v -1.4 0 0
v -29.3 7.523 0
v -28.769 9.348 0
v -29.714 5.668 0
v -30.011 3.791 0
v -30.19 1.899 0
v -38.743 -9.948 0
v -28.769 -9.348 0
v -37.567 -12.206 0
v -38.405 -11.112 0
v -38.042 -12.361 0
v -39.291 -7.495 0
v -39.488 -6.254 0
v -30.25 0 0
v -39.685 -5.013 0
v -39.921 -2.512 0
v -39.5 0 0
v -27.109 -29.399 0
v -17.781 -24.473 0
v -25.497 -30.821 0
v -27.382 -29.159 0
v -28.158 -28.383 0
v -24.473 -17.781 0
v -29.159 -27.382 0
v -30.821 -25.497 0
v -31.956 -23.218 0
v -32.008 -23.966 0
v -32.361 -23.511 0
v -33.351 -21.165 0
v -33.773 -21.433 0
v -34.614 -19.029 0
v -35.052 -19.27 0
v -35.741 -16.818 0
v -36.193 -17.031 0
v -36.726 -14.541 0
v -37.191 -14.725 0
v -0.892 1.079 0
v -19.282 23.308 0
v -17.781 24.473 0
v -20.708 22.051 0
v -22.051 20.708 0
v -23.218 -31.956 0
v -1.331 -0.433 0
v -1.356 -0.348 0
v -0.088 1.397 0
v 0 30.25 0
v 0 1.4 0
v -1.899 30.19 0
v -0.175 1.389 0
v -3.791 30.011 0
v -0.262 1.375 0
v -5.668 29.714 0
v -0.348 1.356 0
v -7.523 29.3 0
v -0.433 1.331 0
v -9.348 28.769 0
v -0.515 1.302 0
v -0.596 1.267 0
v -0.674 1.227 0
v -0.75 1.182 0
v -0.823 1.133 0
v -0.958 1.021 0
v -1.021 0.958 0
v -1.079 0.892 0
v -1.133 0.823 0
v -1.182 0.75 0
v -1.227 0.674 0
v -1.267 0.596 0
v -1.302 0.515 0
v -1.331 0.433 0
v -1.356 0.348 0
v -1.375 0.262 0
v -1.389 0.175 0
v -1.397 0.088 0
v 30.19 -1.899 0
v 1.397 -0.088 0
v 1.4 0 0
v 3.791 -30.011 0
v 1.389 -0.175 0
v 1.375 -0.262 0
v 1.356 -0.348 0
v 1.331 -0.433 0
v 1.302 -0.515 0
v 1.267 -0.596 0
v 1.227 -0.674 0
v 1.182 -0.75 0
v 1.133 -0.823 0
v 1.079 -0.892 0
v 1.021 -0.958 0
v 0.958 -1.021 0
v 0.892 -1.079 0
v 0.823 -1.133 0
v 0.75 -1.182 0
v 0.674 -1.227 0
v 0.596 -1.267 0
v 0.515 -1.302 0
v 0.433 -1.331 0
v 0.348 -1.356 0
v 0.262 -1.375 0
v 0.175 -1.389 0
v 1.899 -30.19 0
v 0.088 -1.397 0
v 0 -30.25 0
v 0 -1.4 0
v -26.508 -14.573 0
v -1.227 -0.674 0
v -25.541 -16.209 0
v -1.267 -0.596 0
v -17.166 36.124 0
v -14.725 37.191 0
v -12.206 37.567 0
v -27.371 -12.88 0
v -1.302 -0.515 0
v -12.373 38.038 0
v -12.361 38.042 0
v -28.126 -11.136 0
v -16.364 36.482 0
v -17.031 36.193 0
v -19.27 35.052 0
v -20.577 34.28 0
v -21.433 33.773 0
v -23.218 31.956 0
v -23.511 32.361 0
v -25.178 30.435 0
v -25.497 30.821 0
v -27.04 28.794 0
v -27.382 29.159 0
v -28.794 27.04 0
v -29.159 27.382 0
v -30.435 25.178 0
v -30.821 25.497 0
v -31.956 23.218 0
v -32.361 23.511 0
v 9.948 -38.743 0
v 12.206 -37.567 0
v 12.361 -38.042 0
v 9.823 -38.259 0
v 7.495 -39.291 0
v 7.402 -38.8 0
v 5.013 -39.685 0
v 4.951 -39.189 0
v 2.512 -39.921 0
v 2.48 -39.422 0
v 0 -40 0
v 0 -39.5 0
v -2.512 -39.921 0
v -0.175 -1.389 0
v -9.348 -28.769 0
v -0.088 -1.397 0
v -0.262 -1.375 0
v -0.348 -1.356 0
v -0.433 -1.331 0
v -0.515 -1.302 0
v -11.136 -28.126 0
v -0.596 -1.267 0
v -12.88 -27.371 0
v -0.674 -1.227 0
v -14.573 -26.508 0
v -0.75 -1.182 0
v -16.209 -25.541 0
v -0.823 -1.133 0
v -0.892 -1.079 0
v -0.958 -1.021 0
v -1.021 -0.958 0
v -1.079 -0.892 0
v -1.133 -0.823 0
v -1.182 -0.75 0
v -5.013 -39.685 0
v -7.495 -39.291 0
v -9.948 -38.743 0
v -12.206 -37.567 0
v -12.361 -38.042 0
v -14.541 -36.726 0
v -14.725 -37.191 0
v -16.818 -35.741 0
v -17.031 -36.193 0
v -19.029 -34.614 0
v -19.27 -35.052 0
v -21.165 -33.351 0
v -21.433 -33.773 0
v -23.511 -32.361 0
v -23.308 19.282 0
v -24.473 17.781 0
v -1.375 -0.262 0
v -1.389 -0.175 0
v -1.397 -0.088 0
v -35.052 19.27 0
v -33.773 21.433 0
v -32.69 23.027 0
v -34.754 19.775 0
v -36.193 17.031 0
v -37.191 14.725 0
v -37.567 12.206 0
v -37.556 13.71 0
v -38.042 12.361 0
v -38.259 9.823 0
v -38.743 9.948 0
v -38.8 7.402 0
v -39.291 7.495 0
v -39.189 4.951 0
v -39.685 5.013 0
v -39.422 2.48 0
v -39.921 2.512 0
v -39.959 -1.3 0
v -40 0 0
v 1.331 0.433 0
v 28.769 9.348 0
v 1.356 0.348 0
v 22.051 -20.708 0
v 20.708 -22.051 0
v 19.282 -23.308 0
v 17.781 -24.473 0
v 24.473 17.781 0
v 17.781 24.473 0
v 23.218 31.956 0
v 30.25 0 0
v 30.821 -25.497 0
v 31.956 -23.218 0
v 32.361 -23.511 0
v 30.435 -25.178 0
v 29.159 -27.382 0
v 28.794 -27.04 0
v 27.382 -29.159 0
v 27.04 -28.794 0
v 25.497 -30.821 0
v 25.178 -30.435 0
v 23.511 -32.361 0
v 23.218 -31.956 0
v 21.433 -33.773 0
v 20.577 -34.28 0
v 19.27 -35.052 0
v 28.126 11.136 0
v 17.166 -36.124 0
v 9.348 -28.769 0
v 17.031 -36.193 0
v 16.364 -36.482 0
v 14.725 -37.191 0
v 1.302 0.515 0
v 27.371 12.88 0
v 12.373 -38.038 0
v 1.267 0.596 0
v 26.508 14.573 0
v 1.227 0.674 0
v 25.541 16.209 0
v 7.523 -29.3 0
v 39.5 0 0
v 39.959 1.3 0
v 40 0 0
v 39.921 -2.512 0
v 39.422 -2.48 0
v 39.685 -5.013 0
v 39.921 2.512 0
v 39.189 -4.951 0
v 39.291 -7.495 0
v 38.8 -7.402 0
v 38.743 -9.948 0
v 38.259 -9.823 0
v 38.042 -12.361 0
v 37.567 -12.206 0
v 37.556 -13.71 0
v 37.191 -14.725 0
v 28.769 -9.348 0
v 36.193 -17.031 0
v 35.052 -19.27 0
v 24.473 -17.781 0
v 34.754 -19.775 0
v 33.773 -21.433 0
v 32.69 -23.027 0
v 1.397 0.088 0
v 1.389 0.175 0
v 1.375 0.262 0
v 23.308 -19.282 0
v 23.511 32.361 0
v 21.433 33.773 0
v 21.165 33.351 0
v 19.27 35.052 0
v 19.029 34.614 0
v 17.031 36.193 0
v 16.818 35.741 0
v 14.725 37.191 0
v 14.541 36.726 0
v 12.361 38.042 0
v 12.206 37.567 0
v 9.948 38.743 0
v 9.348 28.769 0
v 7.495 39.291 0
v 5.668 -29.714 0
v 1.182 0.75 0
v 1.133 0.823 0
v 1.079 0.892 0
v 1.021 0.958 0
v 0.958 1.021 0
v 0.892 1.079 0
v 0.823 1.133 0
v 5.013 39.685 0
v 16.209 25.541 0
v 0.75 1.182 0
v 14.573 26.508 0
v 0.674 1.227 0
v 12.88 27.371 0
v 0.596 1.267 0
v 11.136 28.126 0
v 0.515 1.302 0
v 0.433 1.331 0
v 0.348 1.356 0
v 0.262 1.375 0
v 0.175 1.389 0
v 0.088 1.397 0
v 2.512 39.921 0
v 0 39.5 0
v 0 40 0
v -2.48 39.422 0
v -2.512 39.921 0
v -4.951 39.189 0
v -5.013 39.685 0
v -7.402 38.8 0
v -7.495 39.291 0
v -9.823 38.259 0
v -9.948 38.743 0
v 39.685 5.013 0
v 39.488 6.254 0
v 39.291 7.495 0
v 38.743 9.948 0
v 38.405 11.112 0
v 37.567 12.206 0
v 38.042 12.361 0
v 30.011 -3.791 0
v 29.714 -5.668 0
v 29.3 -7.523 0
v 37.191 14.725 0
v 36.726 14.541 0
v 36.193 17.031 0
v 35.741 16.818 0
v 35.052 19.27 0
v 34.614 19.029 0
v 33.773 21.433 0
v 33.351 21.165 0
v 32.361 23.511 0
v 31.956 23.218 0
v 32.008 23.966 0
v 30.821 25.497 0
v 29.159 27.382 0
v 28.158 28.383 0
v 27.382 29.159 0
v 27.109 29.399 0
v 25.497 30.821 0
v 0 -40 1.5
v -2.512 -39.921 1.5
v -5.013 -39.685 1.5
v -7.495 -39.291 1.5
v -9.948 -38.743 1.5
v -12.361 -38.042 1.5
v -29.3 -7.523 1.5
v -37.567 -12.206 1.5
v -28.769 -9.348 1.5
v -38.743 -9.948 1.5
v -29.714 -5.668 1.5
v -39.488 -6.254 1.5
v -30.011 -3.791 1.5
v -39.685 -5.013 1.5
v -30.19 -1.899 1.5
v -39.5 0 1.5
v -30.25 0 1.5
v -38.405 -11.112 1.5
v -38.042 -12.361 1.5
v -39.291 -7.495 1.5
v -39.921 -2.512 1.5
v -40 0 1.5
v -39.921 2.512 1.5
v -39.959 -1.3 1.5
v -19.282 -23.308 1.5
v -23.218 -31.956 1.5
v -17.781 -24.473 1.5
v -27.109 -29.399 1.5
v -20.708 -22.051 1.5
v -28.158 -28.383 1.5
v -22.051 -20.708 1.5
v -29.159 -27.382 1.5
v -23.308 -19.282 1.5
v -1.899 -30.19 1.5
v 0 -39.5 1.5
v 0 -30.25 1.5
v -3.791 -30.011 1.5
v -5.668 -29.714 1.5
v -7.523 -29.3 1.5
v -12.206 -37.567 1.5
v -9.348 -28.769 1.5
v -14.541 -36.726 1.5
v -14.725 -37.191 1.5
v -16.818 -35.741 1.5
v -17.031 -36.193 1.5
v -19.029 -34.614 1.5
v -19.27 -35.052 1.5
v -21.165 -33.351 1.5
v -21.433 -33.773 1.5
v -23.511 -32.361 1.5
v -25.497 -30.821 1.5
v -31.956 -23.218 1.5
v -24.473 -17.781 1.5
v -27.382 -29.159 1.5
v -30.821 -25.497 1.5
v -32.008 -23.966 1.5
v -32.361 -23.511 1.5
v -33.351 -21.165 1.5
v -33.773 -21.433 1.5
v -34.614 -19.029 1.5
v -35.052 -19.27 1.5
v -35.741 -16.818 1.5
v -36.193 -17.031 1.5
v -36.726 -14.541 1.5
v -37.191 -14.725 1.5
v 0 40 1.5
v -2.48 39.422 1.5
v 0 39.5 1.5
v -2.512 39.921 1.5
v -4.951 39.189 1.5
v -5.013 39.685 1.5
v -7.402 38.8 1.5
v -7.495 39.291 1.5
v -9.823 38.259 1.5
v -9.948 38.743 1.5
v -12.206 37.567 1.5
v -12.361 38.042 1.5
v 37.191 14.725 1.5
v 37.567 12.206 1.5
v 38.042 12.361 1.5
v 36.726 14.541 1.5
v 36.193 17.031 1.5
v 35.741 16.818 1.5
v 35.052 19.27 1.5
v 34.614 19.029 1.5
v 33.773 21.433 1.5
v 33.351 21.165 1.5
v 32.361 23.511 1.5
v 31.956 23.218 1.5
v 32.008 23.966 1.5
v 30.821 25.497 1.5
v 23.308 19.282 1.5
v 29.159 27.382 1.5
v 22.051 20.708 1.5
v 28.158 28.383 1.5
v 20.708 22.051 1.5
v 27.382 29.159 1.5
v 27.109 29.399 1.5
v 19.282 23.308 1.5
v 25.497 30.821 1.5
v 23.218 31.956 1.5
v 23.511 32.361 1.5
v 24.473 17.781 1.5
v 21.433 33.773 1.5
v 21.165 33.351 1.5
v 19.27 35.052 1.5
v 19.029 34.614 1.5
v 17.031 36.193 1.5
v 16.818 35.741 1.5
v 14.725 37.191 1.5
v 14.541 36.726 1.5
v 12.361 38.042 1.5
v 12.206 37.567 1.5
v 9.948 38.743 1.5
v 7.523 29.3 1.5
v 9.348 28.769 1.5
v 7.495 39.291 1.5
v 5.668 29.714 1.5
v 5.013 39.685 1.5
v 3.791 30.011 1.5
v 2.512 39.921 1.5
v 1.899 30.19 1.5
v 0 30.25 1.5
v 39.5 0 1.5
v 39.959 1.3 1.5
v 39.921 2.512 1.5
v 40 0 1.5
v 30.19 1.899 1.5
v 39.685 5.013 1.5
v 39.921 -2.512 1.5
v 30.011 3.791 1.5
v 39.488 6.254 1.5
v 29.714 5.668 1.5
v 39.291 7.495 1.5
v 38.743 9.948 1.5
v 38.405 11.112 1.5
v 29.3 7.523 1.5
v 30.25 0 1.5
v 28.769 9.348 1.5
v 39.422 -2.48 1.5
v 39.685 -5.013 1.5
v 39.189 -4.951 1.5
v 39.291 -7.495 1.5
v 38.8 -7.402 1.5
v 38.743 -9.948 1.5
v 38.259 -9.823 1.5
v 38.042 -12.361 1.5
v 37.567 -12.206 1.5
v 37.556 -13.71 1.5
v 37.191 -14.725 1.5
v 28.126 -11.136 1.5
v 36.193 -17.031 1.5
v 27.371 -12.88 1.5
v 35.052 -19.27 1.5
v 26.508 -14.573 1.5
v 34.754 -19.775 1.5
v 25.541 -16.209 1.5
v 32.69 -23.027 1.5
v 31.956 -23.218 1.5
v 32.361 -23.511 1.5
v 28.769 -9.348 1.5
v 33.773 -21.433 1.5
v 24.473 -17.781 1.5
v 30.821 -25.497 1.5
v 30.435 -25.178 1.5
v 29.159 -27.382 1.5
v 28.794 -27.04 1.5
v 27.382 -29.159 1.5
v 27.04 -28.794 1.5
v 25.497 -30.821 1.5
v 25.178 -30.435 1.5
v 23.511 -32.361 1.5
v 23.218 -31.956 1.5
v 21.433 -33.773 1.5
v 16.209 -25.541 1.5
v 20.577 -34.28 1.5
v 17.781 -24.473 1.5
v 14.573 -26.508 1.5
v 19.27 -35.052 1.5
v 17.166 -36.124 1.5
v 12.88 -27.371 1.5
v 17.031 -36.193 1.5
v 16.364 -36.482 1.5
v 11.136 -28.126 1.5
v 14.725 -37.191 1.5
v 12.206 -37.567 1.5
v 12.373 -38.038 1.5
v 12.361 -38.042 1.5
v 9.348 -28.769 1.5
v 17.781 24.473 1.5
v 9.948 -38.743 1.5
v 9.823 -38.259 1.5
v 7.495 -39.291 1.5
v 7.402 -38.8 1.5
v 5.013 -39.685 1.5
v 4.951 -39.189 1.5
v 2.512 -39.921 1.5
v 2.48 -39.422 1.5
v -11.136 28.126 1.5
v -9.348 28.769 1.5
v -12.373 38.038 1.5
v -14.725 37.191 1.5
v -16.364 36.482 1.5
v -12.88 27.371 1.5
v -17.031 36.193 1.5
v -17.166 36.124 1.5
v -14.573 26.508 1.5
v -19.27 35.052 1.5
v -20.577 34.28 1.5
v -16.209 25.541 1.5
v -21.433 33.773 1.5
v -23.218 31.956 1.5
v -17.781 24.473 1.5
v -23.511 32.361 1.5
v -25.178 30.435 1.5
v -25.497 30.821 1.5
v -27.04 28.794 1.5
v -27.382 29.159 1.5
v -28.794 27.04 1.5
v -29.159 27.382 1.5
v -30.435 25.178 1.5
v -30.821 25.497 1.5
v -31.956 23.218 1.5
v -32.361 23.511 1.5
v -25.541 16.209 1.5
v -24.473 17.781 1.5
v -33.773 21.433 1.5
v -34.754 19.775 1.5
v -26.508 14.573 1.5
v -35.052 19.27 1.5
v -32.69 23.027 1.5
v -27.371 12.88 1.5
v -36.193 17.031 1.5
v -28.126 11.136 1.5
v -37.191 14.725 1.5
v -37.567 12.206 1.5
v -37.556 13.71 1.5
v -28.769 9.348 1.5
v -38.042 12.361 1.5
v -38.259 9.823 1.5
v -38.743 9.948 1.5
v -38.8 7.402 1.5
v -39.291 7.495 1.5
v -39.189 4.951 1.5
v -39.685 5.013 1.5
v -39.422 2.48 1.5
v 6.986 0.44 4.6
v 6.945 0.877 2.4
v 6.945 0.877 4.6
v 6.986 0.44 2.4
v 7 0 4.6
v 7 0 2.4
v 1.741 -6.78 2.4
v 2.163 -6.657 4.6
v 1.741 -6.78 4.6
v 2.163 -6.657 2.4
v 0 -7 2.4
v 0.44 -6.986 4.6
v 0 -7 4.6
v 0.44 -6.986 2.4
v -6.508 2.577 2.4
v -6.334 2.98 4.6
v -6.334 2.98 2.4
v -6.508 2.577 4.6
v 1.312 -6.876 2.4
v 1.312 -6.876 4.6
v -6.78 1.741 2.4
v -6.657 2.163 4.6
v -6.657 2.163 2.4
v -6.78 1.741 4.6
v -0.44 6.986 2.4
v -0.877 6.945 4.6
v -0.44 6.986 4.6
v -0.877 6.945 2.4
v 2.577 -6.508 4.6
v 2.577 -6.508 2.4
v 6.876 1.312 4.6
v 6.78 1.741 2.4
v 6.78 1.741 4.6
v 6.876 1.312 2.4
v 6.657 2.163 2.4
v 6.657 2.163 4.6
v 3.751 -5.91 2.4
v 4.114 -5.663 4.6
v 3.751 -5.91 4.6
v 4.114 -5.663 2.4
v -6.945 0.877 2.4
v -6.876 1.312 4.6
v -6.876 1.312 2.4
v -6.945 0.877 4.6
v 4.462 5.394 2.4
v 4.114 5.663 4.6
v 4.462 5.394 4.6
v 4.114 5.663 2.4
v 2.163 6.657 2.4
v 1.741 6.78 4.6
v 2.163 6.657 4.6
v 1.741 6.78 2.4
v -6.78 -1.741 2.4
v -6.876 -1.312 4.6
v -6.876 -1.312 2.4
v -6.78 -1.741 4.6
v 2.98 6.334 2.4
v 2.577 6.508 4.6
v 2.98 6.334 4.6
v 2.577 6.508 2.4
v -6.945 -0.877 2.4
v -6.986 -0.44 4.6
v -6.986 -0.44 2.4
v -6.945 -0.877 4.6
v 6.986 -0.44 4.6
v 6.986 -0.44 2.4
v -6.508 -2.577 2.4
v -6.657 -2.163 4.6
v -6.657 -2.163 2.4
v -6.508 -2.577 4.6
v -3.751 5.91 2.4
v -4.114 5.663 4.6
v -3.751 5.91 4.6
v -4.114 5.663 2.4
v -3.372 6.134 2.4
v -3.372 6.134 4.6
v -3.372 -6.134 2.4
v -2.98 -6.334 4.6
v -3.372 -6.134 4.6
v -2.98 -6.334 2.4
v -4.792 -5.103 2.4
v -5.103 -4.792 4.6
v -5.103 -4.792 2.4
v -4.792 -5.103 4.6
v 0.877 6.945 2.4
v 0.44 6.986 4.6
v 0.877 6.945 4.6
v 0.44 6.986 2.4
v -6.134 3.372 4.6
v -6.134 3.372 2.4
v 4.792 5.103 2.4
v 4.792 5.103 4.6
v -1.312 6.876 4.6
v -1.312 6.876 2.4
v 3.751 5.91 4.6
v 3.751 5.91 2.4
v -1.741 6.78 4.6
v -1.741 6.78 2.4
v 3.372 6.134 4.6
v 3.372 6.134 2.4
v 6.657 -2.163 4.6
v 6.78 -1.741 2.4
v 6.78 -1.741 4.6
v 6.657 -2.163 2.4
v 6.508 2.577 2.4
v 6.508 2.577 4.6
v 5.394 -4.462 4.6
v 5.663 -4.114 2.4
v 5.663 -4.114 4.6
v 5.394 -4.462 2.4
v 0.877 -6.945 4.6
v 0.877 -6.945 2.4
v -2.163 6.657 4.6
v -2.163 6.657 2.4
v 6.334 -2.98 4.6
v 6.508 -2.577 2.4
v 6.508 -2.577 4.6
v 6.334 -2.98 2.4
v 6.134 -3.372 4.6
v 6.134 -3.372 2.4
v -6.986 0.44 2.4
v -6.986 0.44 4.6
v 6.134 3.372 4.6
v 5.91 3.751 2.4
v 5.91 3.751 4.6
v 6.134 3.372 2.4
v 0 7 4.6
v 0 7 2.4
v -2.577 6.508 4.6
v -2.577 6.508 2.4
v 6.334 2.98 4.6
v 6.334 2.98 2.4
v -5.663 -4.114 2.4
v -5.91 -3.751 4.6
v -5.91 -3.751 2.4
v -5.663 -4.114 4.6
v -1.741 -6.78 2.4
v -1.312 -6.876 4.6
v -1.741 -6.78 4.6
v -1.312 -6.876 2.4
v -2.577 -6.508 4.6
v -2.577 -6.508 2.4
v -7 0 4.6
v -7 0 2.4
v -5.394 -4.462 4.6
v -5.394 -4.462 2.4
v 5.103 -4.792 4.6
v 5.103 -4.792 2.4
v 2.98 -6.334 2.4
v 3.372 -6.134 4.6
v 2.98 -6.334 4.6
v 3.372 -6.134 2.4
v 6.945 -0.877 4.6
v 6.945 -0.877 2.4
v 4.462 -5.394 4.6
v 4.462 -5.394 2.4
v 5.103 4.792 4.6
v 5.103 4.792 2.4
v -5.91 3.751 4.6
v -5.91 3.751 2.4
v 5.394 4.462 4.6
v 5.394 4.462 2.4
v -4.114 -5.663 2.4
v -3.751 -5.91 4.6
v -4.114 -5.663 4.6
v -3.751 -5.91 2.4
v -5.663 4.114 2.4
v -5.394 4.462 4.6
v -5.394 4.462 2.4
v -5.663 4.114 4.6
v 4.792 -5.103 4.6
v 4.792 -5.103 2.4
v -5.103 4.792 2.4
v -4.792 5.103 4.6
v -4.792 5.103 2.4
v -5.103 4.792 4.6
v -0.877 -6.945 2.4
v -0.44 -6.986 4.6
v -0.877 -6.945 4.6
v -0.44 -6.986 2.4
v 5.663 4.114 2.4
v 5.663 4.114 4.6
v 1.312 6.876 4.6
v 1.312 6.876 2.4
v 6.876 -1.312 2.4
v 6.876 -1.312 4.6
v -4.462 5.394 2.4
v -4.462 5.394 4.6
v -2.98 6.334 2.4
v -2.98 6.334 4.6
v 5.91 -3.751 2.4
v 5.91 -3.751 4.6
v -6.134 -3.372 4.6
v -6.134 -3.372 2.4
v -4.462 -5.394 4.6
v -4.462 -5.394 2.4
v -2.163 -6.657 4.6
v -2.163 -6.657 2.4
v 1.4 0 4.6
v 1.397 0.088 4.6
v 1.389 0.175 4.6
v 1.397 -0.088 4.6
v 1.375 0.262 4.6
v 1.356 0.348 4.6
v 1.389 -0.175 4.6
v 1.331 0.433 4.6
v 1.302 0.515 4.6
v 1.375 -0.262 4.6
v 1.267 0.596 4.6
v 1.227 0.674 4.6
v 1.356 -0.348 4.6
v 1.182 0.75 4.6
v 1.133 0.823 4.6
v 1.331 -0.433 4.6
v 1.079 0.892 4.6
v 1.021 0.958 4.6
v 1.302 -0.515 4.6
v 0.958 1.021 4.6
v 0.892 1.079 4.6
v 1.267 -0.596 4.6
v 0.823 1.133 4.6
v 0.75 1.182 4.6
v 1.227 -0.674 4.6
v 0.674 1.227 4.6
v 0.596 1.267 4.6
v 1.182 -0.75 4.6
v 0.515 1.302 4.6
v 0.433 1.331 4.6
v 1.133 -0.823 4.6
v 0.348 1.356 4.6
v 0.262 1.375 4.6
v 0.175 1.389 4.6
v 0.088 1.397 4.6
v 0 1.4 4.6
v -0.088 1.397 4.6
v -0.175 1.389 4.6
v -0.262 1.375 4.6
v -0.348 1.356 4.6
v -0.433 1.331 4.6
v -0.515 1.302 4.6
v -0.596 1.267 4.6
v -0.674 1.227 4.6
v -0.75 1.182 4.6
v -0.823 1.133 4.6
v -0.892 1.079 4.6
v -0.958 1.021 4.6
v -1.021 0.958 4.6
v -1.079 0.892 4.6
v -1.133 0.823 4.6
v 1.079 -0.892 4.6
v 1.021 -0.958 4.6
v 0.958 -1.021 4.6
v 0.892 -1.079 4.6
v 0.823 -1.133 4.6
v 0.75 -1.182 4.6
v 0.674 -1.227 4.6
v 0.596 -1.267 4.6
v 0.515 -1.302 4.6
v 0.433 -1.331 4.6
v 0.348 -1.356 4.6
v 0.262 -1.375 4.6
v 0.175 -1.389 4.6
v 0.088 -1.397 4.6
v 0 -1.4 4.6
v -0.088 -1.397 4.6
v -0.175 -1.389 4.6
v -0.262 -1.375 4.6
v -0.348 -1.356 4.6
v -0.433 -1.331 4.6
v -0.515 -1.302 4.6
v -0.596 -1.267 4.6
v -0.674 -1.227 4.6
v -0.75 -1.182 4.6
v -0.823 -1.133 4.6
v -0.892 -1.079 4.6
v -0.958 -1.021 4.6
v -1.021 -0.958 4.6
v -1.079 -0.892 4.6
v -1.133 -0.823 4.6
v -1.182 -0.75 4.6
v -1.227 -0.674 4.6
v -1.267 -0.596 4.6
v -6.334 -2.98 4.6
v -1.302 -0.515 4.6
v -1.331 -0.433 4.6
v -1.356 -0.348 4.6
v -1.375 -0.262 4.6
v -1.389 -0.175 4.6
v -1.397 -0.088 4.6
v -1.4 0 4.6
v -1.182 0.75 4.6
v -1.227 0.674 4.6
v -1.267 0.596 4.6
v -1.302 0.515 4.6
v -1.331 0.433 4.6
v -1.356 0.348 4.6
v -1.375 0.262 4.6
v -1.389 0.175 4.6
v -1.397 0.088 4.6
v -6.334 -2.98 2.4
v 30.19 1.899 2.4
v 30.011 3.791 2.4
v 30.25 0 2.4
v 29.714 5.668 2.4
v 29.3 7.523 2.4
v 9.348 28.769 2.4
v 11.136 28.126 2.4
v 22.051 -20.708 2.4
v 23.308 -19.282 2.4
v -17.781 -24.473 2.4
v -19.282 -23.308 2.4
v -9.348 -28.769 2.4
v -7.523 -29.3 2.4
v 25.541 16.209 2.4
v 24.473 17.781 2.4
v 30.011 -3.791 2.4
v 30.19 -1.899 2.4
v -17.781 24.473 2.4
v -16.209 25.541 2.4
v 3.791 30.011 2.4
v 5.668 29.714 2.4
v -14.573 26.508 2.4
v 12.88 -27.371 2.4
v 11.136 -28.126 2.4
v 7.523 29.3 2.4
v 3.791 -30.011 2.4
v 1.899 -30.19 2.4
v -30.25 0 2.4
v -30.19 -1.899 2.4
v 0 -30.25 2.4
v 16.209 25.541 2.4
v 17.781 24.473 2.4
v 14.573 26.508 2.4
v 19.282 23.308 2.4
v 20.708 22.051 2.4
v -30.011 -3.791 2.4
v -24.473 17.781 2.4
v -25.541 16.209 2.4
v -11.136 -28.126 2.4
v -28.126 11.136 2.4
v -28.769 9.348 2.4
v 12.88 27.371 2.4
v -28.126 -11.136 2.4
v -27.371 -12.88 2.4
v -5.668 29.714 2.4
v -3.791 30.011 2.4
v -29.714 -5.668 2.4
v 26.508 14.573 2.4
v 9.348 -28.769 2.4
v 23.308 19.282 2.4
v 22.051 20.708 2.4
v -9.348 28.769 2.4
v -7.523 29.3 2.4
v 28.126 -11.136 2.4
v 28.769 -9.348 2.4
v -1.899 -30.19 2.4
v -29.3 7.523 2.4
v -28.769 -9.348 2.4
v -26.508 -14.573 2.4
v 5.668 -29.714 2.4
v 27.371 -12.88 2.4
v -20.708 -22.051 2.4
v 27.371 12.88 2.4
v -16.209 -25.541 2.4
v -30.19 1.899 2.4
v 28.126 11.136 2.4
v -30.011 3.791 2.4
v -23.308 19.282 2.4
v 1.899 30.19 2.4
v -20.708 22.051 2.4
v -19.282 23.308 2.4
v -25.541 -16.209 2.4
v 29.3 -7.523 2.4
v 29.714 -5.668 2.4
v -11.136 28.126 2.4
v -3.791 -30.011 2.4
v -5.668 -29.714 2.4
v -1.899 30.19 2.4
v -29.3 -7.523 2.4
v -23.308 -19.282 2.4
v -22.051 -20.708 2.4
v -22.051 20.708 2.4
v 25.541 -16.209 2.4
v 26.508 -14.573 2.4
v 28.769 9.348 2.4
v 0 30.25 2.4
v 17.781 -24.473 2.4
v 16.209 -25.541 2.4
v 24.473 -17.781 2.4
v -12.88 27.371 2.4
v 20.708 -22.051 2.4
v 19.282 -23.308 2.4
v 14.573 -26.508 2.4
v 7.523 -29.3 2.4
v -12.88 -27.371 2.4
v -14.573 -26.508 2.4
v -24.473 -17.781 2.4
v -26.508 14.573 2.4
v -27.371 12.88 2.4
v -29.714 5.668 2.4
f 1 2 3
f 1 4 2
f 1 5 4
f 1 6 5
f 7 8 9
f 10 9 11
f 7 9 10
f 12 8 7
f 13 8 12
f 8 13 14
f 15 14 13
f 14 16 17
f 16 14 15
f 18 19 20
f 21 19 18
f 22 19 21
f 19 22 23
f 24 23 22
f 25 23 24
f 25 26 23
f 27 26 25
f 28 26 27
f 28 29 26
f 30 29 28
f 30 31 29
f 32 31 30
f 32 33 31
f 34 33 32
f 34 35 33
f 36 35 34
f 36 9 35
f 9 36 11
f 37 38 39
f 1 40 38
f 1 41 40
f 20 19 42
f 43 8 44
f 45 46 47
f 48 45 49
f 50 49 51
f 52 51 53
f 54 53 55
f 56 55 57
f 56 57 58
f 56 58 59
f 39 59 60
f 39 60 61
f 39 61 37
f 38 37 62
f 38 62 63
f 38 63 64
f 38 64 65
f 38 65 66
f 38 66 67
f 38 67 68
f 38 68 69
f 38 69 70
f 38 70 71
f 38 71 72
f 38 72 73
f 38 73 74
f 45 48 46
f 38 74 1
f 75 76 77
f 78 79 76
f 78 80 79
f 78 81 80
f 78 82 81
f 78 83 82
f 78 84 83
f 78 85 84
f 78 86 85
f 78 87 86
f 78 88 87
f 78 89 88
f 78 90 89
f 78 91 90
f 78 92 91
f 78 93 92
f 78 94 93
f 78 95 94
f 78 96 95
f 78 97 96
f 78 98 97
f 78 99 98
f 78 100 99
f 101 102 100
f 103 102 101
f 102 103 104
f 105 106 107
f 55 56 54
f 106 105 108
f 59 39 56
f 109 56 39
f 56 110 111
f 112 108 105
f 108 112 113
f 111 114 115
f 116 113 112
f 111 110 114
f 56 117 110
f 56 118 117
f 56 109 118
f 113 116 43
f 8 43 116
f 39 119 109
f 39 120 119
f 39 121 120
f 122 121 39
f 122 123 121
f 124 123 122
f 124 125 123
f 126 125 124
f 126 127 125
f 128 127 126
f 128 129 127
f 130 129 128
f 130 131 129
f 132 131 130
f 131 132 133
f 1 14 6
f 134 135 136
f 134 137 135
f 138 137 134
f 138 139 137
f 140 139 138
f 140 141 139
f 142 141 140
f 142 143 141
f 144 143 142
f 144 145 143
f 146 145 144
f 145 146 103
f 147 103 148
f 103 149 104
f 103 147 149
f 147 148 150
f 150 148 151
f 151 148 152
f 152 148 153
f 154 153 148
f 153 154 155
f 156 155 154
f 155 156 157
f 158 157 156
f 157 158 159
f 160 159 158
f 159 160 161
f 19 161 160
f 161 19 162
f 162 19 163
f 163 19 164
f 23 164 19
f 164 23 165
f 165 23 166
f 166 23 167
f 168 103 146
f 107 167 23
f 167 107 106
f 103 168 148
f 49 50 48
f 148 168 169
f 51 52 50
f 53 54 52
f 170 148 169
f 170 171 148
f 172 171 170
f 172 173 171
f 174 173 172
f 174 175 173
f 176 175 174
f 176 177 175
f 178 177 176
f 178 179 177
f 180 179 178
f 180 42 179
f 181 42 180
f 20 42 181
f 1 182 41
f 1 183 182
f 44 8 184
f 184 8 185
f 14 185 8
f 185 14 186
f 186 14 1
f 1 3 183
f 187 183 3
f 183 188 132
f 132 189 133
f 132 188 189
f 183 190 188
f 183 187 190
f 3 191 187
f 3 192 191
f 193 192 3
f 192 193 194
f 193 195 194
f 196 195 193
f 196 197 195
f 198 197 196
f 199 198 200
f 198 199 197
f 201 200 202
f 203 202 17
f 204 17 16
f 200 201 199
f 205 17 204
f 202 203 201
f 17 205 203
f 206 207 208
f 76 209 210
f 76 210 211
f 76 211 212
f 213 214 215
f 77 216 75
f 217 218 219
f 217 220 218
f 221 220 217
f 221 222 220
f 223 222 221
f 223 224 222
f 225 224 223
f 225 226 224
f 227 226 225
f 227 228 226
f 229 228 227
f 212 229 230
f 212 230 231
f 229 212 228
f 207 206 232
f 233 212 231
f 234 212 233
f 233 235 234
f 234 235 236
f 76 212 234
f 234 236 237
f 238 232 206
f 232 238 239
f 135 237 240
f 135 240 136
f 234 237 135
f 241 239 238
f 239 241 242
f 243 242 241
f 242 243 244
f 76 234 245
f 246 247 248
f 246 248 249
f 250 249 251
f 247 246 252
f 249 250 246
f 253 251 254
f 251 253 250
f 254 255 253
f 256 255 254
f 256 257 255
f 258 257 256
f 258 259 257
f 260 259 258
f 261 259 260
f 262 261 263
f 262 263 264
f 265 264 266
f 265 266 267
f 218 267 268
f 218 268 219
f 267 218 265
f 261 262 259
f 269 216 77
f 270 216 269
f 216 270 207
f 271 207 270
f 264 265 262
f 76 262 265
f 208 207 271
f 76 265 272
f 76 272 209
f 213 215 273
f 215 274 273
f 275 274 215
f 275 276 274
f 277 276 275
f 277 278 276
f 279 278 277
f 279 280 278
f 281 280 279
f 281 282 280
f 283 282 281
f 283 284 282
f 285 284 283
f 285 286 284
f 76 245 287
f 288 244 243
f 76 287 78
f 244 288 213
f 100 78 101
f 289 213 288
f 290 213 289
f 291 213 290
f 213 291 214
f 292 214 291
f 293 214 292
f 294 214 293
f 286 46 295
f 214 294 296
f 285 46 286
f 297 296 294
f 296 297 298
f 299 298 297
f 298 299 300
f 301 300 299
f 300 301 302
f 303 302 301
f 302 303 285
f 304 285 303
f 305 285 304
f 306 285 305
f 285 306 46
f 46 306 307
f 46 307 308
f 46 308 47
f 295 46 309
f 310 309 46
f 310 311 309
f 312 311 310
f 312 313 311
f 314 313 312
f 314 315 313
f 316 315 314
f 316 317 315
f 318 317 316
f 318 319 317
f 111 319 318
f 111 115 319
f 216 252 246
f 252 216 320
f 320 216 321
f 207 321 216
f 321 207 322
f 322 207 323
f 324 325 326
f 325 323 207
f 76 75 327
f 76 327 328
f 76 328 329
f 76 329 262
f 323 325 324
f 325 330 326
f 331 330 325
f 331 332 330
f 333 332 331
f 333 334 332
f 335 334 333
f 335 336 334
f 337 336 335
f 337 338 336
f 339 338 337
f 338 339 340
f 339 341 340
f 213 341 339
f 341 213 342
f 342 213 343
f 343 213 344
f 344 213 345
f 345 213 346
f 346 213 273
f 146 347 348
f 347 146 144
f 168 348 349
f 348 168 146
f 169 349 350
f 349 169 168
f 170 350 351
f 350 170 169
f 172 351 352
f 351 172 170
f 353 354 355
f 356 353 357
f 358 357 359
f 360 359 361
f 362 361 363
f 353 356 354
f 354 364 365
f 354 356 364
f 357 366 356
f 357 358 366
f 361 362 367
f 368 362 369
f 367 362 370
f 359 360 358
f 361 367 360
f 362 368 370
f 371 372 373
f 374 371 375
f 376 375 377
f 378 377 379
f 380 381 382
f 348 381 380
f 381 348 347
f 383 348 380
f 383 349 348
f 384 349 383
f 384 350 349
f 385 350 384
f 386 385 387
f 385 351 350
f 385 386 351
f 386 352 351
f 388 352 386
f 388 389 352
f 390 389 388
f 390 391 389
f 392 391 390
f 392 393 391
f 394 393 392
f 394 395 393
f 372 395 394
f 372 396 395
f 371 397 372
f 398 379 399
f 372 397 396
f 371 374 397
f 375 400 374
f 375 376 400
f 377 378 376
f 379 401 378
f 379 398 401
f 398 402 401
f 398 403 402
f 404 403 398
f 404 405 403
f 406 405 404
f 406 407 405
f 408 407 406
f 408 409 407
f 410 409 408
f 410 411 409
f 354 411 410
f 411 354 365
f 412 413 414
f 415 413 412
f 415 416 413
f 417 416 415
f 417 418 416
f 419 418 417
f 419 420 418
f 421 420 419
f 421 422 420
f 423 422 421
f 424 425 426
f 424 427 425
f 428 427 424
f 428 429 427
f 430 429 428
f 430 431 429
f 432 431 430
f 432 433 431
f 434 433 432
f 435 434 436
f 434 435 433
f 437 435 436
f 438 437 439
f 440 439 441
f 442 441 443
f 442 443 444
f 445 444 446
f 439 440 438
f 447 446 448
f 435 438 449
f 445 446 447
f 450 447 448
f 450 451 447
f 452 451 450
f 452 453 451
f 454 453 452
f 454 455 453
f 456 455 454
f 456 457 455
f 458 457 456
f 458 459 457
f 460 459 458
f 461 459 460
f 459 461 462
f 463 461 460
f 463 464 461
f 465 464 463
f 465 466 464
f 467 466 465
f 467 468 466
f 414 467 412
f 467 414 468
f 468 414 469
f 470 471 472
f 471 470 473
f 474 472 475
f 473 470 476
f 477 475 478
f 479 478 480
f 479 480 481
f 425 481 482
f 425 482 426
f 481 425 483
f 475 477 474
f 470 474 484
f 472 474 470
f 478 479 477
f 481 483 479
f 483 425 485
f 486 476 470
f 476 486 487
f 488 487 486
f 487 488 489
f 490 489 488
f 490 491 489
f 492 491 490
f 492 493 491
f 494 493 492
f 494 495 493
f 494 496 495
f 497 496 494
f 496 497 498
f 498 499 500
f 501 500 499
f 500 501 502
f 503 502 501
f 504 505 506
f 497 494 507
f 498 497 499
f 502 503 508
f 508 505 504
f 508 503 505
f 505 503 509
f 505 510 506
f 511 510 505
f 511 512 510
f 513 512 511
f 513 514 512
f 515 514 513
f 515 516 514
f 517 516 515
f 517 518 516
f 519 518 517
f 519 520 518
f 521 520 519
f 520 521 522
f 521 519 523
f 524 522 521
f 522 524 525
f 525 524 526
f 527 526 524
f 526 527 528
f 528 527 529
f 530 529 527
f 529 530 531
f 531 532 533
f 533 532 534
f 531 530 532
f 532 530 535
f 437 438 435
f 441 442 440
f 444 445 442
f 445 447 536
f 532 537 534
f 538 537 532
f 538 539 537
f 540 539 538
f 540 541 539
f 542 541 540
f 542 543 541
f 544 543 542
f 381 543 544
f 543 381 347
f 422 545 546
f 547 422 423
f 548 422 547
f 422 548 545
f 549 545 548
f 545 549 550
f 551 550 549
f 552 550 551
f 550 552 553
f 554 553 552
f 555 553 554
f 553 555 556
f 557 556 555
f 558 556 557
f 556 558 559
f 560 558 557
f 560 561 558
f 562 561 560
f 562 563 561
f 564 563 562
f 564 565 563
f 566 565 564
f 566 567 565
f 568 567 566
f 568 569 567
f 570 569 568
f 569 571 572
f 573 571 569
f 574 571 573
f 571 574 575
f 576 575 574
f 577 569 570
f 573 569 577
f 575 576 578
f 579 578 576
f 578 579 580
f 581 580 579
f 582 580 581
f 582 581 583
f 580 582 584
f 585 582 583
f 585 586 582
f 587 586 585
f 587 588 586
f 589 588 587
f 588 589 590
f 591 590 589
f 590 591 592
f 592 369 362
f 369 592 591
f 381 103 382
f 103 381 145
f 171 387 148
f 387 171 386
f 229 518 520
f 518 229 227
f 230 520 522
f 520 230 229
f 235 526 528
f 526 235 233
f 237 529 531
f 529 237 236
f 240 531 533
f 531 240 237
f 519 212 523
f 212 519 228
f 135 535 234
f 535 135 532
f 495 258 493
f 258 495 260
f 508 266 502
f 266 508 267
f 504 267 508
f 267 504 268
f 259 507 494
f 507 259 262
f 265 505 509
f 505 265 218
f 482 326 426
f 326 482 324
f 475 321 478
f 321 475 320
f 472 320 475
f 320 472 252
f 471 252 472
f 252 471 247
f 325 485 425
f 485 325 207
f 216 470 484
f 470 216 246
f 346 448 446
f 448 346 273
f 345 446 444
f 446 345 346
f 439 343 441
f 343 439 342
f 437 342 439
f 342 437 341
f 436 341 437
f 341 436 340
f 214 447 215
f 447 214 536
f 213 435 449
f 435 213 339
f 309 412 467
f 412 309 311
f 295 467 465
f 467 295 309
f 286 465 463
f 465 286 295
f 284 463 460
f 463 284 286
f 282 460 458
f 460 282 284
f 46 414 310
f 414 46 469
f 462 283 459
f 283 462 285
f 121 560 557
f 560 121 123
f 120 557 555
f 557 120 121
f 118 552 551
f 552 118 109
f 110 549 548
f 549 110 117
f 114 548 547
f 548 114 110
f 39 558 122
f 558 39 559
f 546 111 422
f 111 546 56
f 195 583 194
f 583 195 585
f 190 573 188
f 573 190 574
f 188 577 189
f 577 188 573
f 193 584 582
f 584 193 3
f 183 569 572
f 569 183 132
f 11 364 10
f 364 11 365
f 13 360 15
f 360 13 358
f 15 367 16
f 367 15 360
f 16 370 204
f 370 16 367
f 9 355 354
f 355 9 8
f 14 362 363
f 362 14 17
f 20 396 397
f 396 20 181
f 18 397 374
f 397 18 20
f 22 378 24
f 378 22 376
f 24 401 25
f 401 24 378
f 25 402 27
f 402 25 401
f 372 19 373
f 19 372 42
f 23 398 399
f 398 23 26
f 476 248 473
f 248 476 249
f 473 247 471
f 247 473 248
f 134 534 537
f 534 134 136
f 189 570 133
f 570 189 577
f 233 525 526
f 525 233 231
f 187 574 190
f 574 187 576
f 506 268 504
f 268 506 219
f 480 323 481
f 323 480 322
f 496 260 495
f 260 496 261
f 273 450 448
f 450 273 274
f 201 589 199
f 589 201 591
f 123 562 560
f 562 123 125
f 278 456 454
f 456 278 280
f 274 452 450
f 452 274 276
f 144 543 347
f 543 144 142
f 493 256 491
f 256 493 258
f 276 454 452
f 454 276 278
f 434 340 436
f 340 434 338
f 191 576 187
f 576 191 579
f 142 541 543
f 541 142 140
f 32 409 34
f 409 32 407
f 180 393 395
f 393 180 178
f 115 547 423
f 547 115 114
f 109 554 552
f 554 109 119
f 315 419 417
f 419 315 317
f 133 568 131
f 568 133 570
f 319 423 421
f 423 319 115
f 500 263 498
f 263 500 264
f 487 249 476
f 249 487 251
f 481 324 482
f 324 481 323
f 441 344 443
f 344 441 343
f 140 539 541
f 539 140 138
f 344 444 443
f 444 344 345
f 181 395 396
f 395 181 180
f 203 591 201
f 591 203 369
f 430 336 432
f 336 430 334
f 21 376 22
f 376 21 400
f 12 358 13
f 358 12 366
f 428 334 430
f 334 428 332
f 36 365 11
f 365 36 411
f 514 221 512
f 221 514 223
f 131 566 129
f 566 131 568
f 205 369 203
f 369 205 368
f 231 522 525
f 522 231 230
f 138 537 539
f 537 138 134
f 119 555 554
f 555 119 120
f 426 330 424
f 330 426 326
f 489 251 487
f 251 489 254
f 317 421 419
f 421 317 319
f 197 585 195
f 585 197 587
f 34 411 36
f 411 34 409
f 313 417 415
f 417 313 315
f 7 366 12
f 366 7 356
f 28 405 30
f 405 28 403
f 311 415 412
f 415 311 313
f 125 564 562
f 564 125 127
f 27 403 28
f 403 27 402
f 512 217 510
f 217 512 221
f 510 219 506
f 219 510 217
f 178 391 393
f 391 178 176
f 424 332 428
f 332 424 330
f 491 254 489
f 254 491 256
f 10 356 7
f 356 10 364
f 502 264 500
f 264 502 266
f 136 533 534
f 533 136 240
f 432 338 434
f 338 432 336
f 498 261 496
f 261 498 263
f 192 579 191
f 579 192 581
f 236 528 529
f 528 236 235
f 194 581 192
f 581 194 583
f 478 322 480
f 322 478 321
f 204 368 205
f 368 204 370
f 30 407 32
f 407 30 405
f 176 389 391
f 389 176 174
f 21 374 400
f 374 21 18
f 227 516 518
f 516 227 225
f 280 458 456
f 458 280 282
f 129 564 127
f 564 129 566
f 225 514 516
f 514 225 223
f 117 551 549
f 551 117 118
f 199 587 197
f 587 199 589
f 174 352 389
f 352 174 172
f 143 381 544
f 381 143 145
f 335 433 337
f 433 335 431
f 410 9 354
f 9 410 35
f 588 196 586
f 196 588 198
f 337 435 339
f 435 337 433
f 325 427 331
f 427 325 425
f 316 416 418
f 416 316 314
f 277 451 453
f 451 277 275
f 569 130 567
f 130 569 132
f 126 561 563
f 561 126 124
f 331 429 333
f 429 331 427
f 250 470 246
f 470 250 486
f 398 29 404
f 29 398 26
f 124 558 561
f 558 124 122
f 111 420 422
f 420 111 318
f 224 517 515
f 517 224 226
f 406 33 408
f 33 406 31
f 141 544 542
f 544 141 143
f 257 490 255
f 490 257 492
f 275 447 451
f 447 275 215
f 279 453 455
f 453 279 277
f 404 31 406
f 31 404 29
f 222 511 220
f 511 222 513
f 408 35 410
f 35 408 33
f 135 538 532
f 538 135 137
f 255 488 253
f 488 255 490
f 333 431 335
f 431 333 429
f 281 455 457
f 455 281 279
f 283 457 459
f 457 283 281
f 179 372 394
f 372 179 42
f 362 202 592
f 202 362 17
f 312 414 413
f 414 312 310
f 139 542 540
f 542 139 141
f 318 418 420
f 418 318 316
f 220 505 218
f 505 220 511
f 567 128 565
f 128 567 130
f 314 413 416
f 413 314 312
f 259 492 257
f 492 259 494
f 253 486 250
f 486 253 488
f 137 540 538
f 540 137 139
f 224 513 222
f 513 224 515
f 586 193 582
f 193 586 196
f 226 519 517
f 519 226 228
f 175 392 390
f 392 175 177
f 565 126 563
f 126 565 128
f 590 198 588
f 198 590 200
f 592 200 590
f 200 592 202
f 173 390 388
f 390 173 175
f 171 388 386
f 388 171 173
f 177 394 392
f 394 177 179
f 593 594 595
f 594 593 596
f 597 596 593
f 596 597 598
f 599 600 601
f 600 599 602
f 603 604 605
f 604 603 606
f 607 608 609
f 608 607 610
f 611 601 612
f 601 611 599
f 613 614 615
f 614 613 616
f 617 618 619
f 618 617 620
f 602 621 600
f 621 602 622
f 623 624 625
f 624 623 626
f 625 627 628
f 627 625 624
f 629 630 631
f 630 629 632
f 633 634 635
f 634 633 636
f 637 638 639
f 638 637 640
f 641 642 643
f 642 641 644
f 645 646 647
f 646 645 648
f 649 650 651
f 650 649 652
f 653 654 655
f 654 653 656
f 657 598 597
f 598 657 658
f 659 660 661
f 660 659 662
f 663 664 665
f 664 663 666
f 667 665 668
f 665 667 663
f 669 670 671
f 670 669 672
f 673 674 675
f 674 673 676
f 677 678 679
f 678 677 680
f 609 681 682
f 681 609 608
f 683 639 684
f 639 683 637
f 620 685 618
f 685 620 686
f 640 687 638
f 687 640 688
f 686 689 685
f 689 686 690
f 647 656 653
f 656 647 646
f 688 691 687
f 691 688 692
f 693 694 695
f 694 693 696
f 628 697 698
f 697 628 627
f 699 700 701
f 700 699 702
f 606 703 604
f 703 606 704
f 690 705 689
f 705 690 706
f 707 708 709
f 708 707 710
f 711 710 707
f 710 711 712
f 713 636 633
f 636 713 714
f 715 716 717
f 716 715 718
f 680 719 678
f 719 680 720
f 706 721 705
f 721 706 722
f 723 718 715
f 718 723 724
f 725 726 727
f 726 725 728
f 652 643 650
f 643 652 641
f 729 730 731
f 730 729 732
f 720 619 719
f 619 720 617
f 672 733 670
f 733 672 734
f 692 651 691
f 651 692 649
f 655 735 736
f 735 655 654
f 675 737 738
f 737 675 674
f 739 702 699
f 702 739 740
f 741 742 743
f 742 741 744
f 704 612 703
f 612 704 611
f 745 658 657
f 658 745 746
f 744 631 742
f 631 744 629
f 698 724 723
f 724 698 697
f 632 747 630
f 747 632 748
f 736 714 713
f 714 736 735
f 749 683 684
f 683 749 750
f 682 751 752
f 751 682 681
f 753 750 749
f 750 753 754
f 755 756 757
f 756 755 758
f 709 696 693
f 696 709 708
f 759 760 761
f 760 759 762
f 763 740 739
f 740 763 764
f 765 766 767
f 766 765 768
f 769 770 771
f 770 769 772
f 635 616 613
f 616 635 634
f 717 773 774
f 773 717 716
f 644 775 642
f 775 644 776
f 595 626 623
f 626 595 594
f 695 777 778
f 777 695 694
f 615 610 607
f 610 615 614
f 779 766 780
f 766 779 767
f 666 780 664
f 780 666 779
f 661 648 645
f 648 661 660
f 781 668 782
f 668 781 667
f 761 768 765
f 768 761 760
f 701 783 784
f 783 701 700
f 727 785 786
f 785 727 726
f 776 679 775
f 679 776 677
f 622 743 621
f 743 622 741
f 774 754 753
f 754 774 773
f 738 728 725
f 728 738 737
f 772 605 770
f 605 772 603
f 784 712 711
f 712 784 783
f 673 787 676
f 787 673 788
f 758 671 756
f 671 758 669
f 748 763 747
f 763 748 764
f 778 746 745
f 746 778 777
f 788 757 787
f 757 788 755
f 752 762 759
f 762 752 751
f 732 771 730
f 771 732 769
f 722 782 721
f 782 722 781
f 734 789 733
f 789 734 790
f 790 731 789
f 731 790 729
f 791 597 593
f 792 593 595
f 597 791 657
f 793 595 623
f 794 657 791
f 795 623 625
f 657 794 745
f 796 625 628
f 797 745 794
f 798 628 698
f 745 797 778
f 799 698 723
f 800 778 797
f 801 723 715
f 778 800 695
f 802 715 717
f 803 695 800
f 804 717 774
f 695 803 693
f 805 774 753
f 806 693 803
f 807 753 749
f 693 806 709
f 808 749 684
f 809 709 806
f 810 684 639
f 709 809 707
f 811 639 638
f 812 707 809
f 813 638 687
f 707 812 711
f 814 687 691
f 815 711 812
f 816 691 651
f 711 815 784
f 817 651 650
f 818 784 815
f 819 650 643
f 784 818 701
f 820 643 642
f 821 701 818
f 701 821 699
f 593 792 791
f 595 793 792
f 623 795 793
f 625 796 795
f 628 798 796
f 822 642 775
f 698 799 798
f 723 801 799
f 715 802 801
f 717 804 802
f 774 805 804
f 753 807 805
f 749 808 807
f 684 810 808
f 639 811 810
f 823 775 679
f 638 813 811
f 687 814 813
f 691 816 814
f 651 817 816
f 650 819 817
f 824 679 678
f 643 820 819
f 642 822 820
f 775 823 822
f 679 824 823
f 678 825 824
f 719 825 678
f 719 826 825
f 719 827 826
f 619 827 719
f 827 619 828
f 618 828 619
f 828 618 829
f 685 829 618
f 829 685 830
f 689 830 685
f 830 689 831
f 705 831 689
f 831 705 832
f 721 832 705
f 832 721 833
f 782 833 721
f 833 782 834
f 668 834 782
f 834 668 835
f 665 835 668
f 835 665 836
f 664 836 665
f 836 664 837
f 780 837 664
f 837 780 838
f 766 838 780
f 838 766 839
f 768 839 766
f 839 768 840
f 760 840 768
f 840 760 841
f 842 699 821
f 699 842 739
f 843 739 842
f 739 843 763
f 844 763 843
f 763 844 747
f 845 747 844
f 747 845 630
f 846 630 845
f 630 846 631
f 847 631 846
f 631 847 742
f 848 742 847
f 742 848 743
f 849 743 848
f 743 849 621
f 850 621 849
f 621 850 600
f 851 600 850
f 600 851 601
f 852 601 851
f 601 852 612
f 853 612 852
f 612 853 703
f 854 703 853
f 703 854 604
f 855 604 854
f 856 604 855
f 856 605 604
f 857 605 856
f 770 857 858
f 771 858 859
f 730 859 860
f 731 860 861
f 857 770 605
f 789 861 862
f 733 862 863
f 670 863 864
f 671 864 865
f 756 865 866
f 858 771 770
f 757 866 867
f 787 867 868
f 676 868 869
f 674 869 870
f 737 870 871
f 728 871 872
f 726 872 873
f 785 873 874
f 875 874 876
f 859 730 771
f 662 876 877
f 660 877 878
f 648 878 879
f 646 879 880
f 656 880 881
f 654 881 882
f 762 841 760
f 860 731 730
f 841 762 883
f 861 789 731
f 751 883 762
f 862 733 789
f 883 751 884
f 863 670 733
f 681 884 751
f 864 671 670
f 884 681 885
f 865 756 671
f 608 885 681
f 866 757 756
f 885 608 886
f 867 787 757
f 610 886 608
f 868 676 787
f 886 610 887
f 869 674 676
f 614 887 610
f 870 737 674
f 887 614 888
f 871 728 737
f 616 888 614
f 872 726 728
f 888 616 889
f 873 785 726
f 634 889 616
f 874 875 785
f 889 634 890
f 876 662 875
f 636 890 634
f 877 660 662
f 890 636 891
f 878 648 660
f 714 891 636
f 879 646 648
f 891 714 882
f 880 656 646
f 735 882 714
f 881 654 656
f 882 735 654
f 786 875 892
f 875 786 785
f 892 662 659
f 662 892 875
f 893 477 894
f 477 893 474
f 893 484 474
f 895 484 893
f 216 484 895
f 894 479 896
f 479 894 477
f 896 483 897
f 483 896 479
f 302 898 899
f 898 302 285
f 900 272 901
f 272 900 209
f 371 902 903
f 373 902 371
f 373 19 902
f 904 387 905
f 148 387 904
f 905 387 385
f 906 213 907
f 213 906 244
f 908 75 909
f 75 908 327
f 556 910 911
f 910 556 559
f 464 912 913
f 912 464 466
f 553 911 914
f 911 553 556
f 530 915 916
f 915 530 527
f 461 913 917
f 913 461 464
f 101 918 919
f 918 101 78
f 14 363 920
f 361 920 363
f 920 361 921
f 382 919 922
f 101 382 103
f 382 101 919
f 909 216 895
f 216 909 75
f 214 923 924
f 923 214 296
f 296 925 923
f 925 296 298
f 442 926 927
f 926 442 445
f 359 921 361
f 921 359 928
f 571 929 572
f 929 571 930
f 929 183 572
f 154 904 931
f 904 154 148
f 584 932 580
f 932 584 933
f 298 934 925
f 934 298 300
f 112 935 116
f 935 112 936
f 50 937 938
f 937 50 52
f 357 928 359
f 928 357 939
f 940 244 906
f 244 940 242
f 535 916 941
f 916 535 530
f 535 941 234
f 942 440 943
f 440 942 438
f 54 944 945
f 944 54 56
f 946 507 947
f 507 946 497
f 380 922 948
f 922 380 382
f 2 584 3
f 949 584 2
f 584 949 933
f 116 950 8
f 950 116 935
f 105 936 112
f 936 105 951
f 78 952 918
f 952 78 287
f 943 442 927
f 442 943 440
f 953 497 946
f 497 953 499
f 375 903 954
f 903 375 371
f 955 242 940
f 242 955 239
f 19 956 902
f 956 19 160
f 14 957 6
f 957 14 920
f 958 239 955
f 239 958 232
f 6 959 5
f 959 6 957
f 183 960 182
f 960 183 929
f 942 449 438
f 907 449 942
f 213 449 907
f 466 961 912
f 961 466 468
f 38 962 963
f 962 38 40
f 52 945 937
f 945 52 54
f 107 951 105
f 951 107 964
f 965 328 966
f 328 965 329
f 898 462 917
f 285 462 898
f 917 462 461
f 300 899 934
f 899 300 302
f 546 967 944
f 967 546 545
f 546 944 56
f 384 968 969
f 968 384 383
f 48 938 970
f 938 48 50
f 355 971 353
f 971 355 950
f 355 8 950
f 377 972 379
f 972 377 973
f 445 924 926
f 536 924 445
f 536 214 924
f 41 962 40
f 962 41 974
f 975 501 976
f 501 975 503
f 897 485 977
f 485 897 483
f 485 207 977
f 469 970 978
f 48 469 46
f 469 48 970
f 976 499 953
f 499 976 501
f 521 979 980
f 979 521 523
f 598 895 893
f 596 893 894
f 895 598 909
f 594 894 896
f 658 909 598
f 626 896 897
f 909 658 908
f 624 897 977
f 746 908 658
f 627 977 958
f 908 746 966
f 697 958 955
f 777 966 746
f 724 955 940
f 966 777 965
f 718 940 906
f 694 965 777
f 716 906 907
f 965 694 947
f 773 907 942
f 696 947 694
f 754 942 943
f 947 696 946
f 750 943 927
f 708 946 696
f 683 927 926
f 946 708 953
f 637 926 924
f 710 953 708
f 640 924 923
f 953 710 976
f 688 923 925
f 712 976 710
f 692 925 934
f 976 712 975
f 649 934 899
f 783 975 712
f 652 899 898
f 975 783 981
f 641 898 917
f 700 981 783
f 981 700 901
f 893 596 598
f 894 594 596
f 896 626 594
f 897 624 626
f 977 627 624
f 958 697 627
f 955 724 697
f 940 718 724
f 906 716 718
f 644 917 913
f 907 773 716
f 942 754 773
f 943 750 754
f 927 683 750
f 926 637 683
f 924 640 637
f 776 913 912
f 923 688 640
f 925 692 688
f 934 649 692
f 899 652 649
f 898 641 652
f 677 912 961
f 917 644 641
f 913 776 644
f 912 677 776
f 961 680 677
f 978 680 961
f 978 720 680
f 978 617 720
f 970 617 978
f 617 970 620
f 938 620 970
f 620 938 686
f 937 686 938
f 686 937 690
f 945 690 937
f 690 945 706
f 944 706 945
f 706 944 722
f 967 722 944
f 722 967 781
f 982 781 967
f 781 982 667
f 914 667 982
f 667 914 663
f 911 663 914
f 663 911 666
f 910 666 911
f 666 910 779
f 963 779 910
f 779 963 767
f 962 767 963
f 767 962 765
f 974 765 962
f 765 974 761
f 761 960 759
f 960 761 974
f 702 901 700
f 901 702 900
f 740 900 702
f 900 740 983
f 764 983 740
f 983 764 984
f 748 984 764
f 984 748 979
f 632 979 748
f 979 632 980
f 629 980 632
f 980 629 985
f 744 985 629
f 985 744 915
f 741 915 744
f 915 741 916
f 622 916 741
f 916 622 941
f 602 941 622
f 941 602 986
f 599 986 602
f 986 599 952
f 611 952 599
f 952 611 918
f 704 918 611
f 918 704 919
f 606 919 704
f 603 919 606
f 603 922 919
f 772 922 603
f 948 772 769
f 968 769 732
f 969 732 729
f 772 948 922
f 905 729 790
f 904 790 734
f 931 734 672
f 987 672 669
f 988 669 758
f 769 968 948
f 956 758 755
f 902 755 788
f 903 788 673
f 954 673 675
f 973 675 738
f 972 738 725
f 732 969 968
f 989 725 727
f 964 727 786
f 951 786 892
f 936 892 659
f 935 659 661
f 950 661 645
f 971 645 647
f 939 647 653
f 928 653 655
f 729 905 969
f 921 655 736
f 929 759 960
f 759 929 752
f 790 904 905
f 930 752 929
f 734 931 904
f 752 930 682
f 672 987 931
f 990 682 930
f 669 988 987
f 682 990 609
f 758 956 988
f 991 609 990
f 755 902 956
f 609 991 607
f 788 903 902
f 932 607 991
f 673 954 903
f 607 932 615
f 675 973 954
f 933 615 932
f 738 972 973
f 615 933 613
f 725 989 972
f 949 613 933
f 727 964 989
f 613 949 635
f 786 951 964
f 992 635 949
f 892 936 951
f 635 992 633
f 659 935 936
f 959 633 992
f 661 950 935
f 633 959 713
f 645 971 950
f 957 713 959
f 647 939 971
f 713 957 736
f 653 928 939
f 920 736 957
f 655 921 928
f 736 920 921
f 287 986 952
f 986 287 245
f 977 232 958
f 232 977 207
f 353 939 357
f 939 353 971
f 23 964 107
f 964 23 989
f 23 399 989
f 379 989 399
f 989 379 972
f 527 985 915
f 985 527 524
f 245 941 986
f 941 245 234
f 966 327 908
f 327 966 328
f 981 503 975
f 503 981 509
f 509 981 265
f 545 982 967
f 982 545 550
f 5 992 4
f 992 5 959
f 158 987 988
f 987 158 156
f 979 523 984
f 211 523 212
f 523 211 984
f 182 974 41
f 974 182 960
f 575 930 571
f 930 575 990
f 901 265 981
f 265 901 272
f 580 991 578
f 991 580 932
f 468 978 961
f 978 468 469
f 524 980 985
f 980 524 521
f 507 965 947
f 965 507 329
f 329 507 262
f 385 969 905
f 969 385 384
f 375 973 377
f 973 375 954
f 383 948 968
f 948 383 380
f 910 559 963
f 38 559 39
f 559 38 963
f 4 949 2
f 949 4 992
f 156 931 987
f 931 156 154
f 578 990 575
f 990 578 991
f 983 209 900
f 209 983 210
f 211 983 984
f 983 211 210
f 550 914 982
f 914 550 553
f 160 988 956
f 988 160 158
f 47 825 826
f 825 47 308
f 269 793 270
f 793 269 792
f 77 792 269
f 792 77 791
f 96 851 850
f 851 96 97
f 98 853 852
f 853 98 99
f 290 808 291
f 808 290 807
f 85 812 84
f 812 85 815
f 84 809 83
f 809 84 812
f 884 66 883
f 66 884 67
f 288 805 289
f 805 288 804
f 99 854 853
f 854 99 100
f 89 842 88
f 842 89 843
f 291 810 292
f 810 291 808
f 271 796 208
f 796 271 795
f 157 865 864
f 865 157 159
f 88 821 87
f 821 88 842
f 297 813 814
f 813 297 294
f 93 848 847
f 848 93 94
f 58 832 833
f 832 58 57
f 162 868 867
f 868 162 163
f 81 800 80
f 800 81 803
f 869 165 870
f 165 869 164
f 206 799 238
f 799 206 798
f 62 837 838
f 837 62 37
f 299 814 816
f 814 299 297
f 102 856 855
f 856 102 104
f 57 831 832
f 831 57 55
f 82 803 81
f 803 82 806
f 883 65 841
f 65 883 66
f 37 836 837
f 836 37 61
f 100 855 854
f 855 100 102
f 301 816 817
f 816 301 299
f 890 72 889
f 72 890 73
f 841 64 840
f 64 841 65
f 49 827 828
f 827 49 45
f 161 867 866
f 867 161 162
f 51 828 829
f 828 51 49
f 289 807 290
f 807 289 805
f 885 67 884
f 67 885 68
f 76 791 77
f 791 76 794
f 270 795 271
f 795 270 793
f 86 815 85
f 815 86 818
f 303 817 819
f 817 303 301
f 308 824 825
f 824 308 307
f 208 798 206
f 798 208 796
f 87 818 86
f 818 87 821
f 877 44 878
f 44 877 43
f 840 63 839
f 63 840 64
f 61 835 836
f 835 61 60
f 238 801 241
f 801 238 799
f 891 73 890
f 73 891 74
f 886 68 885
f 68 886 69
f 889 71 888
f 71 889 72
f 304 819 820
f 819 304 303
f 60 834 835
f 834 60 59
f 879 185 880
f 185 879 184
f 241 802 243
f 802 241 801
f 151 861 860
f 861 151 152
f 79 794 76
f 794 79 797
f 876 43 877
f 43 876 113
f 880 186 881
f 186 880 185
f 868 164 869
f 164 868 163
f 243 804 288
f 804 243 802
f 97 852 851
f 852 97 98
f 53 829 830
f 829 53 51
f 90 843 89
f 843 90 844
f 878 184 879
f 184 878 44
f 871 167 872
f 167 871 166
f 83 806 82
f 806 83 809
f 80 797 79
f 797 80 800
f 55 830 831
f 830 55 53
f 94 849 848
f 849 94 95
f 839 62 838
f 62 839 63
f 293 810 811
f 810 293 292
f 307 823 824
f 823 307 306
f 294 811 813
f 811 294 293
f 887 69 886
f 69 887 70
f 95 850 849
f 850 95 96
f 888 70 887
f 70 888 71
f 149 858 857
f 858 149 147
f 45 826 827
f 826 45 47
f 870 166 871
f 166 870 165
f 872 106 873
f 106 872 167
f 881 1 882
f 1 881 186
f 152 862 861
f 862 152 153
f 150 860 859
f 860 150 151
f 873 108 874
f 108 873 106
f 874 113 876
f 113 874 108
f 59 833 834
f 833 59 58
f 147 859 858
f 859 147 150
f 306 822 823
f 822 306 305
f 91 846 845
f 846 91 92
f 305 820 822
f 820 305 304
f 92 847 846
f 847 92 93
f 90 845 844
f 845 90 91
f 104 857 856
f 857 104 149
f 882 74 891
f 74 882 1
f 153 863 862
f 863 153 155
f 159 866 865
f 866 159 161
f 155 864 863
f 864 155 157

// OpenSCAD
/* Code wheel for fairlead sheave
 * Date: 20170116
 * codewheel_1
 */
 
 dia_center_hole = (2.8); // Center mounting hole
 thick_center_hole = (4.6); // Thickness at center hole
 dia_magtop = (14.0);  // Diameter flat of magnet top

 dia_taper = (30); // Diameter where taper ends
 nsegs = 6;  // Number of segments
 
 thick_1st_step = (2.4); // 
 dia_1st_step = (60.5);
 
 thick_seg = (1.5);   // Thickness at segments
 dia_seg = (50);    // Outer dia of segments
 dia_overall = (dia_seg + 3);
 thick_rim = (thick_seg + 1); // Rim slightly thicker
 
 timingHoles = 10;
 encoderDiameter = 40;
 
 outer_rim_dia = 80;  
 thick_outer_rim = thick_seg;
 width_outer_rim = 1;
 
 quant = 100;
 $fn = quant; // Quantization

module center_hole()
{
    cylinder(h = thick_center_hole, d = dia_center_hole, center = false);
}

module center_post()
{
    cylinder(h = thick_center_hole, d = dia_magtop, center = false);
}

module first_step()
{ 
        cylinder(h = thick_1st_step, d = dia_1st_step, center = false);
}

module segs()
{
    cylinder(h = thick_seg, d = dia_seg, center = false);
}

module outer_rim()
{   
    render()
    {
    difference() {
        cylinder(h = thick_outer_rim, d = outer_rim_dia, center = false);
        cylinder(h = thick_outer_rim, d = outer_rim_dia - width_outer_rim, center = false);
    }
}
}

module arc( height, depth, radius, degrees ) {
	// This dies a horible death if it's not rendered here 
	// -- sucks up all memory and spins out of control 
	render() {
		difference() {
			// Outer ring
			rotate_extrude($fn = quant)
				translate([radius - height, 0, 0])
					square([height,depth]);
		
			// Cut half off
			translate([0,-(radius+1),-.5]) 
				cube ([radius+1,(radius+1)*2,depth+1]);
		
			// Cover the other half as necessary
			rotate([0,0,180-degrees])
			translate([0,-(radius+1),-.5]) 
				cube ([radius+1,(radius+1)*2,depth+1]);	
		}
	}
}

	// Punch out timing holes	
//D_arc(w=thickness_of_arc, r=radius_of_arc, deg=degrees_of_arc_angle, fn=resolution, h=height_of_arc);
module timing_holes()
{
        for ( i = [0 : timingHoles-1] ) {
            rotate( i*(360/timingHoles), [0, 0, 1])
			arc( 10,  /* Height */
			thick_seg, /* Depth */
			encoderDiameter, /* Radius */
			degrees =180/timingHoles); /* Degrees */
	}
}            
            
module main()
{
    difference()
    {
        union()
        {
            center_post();
            first_step();
            segs();
            timing_holes();
            outer_rim();
        }
           center_hole();
        
        
    }
    
}
main();
